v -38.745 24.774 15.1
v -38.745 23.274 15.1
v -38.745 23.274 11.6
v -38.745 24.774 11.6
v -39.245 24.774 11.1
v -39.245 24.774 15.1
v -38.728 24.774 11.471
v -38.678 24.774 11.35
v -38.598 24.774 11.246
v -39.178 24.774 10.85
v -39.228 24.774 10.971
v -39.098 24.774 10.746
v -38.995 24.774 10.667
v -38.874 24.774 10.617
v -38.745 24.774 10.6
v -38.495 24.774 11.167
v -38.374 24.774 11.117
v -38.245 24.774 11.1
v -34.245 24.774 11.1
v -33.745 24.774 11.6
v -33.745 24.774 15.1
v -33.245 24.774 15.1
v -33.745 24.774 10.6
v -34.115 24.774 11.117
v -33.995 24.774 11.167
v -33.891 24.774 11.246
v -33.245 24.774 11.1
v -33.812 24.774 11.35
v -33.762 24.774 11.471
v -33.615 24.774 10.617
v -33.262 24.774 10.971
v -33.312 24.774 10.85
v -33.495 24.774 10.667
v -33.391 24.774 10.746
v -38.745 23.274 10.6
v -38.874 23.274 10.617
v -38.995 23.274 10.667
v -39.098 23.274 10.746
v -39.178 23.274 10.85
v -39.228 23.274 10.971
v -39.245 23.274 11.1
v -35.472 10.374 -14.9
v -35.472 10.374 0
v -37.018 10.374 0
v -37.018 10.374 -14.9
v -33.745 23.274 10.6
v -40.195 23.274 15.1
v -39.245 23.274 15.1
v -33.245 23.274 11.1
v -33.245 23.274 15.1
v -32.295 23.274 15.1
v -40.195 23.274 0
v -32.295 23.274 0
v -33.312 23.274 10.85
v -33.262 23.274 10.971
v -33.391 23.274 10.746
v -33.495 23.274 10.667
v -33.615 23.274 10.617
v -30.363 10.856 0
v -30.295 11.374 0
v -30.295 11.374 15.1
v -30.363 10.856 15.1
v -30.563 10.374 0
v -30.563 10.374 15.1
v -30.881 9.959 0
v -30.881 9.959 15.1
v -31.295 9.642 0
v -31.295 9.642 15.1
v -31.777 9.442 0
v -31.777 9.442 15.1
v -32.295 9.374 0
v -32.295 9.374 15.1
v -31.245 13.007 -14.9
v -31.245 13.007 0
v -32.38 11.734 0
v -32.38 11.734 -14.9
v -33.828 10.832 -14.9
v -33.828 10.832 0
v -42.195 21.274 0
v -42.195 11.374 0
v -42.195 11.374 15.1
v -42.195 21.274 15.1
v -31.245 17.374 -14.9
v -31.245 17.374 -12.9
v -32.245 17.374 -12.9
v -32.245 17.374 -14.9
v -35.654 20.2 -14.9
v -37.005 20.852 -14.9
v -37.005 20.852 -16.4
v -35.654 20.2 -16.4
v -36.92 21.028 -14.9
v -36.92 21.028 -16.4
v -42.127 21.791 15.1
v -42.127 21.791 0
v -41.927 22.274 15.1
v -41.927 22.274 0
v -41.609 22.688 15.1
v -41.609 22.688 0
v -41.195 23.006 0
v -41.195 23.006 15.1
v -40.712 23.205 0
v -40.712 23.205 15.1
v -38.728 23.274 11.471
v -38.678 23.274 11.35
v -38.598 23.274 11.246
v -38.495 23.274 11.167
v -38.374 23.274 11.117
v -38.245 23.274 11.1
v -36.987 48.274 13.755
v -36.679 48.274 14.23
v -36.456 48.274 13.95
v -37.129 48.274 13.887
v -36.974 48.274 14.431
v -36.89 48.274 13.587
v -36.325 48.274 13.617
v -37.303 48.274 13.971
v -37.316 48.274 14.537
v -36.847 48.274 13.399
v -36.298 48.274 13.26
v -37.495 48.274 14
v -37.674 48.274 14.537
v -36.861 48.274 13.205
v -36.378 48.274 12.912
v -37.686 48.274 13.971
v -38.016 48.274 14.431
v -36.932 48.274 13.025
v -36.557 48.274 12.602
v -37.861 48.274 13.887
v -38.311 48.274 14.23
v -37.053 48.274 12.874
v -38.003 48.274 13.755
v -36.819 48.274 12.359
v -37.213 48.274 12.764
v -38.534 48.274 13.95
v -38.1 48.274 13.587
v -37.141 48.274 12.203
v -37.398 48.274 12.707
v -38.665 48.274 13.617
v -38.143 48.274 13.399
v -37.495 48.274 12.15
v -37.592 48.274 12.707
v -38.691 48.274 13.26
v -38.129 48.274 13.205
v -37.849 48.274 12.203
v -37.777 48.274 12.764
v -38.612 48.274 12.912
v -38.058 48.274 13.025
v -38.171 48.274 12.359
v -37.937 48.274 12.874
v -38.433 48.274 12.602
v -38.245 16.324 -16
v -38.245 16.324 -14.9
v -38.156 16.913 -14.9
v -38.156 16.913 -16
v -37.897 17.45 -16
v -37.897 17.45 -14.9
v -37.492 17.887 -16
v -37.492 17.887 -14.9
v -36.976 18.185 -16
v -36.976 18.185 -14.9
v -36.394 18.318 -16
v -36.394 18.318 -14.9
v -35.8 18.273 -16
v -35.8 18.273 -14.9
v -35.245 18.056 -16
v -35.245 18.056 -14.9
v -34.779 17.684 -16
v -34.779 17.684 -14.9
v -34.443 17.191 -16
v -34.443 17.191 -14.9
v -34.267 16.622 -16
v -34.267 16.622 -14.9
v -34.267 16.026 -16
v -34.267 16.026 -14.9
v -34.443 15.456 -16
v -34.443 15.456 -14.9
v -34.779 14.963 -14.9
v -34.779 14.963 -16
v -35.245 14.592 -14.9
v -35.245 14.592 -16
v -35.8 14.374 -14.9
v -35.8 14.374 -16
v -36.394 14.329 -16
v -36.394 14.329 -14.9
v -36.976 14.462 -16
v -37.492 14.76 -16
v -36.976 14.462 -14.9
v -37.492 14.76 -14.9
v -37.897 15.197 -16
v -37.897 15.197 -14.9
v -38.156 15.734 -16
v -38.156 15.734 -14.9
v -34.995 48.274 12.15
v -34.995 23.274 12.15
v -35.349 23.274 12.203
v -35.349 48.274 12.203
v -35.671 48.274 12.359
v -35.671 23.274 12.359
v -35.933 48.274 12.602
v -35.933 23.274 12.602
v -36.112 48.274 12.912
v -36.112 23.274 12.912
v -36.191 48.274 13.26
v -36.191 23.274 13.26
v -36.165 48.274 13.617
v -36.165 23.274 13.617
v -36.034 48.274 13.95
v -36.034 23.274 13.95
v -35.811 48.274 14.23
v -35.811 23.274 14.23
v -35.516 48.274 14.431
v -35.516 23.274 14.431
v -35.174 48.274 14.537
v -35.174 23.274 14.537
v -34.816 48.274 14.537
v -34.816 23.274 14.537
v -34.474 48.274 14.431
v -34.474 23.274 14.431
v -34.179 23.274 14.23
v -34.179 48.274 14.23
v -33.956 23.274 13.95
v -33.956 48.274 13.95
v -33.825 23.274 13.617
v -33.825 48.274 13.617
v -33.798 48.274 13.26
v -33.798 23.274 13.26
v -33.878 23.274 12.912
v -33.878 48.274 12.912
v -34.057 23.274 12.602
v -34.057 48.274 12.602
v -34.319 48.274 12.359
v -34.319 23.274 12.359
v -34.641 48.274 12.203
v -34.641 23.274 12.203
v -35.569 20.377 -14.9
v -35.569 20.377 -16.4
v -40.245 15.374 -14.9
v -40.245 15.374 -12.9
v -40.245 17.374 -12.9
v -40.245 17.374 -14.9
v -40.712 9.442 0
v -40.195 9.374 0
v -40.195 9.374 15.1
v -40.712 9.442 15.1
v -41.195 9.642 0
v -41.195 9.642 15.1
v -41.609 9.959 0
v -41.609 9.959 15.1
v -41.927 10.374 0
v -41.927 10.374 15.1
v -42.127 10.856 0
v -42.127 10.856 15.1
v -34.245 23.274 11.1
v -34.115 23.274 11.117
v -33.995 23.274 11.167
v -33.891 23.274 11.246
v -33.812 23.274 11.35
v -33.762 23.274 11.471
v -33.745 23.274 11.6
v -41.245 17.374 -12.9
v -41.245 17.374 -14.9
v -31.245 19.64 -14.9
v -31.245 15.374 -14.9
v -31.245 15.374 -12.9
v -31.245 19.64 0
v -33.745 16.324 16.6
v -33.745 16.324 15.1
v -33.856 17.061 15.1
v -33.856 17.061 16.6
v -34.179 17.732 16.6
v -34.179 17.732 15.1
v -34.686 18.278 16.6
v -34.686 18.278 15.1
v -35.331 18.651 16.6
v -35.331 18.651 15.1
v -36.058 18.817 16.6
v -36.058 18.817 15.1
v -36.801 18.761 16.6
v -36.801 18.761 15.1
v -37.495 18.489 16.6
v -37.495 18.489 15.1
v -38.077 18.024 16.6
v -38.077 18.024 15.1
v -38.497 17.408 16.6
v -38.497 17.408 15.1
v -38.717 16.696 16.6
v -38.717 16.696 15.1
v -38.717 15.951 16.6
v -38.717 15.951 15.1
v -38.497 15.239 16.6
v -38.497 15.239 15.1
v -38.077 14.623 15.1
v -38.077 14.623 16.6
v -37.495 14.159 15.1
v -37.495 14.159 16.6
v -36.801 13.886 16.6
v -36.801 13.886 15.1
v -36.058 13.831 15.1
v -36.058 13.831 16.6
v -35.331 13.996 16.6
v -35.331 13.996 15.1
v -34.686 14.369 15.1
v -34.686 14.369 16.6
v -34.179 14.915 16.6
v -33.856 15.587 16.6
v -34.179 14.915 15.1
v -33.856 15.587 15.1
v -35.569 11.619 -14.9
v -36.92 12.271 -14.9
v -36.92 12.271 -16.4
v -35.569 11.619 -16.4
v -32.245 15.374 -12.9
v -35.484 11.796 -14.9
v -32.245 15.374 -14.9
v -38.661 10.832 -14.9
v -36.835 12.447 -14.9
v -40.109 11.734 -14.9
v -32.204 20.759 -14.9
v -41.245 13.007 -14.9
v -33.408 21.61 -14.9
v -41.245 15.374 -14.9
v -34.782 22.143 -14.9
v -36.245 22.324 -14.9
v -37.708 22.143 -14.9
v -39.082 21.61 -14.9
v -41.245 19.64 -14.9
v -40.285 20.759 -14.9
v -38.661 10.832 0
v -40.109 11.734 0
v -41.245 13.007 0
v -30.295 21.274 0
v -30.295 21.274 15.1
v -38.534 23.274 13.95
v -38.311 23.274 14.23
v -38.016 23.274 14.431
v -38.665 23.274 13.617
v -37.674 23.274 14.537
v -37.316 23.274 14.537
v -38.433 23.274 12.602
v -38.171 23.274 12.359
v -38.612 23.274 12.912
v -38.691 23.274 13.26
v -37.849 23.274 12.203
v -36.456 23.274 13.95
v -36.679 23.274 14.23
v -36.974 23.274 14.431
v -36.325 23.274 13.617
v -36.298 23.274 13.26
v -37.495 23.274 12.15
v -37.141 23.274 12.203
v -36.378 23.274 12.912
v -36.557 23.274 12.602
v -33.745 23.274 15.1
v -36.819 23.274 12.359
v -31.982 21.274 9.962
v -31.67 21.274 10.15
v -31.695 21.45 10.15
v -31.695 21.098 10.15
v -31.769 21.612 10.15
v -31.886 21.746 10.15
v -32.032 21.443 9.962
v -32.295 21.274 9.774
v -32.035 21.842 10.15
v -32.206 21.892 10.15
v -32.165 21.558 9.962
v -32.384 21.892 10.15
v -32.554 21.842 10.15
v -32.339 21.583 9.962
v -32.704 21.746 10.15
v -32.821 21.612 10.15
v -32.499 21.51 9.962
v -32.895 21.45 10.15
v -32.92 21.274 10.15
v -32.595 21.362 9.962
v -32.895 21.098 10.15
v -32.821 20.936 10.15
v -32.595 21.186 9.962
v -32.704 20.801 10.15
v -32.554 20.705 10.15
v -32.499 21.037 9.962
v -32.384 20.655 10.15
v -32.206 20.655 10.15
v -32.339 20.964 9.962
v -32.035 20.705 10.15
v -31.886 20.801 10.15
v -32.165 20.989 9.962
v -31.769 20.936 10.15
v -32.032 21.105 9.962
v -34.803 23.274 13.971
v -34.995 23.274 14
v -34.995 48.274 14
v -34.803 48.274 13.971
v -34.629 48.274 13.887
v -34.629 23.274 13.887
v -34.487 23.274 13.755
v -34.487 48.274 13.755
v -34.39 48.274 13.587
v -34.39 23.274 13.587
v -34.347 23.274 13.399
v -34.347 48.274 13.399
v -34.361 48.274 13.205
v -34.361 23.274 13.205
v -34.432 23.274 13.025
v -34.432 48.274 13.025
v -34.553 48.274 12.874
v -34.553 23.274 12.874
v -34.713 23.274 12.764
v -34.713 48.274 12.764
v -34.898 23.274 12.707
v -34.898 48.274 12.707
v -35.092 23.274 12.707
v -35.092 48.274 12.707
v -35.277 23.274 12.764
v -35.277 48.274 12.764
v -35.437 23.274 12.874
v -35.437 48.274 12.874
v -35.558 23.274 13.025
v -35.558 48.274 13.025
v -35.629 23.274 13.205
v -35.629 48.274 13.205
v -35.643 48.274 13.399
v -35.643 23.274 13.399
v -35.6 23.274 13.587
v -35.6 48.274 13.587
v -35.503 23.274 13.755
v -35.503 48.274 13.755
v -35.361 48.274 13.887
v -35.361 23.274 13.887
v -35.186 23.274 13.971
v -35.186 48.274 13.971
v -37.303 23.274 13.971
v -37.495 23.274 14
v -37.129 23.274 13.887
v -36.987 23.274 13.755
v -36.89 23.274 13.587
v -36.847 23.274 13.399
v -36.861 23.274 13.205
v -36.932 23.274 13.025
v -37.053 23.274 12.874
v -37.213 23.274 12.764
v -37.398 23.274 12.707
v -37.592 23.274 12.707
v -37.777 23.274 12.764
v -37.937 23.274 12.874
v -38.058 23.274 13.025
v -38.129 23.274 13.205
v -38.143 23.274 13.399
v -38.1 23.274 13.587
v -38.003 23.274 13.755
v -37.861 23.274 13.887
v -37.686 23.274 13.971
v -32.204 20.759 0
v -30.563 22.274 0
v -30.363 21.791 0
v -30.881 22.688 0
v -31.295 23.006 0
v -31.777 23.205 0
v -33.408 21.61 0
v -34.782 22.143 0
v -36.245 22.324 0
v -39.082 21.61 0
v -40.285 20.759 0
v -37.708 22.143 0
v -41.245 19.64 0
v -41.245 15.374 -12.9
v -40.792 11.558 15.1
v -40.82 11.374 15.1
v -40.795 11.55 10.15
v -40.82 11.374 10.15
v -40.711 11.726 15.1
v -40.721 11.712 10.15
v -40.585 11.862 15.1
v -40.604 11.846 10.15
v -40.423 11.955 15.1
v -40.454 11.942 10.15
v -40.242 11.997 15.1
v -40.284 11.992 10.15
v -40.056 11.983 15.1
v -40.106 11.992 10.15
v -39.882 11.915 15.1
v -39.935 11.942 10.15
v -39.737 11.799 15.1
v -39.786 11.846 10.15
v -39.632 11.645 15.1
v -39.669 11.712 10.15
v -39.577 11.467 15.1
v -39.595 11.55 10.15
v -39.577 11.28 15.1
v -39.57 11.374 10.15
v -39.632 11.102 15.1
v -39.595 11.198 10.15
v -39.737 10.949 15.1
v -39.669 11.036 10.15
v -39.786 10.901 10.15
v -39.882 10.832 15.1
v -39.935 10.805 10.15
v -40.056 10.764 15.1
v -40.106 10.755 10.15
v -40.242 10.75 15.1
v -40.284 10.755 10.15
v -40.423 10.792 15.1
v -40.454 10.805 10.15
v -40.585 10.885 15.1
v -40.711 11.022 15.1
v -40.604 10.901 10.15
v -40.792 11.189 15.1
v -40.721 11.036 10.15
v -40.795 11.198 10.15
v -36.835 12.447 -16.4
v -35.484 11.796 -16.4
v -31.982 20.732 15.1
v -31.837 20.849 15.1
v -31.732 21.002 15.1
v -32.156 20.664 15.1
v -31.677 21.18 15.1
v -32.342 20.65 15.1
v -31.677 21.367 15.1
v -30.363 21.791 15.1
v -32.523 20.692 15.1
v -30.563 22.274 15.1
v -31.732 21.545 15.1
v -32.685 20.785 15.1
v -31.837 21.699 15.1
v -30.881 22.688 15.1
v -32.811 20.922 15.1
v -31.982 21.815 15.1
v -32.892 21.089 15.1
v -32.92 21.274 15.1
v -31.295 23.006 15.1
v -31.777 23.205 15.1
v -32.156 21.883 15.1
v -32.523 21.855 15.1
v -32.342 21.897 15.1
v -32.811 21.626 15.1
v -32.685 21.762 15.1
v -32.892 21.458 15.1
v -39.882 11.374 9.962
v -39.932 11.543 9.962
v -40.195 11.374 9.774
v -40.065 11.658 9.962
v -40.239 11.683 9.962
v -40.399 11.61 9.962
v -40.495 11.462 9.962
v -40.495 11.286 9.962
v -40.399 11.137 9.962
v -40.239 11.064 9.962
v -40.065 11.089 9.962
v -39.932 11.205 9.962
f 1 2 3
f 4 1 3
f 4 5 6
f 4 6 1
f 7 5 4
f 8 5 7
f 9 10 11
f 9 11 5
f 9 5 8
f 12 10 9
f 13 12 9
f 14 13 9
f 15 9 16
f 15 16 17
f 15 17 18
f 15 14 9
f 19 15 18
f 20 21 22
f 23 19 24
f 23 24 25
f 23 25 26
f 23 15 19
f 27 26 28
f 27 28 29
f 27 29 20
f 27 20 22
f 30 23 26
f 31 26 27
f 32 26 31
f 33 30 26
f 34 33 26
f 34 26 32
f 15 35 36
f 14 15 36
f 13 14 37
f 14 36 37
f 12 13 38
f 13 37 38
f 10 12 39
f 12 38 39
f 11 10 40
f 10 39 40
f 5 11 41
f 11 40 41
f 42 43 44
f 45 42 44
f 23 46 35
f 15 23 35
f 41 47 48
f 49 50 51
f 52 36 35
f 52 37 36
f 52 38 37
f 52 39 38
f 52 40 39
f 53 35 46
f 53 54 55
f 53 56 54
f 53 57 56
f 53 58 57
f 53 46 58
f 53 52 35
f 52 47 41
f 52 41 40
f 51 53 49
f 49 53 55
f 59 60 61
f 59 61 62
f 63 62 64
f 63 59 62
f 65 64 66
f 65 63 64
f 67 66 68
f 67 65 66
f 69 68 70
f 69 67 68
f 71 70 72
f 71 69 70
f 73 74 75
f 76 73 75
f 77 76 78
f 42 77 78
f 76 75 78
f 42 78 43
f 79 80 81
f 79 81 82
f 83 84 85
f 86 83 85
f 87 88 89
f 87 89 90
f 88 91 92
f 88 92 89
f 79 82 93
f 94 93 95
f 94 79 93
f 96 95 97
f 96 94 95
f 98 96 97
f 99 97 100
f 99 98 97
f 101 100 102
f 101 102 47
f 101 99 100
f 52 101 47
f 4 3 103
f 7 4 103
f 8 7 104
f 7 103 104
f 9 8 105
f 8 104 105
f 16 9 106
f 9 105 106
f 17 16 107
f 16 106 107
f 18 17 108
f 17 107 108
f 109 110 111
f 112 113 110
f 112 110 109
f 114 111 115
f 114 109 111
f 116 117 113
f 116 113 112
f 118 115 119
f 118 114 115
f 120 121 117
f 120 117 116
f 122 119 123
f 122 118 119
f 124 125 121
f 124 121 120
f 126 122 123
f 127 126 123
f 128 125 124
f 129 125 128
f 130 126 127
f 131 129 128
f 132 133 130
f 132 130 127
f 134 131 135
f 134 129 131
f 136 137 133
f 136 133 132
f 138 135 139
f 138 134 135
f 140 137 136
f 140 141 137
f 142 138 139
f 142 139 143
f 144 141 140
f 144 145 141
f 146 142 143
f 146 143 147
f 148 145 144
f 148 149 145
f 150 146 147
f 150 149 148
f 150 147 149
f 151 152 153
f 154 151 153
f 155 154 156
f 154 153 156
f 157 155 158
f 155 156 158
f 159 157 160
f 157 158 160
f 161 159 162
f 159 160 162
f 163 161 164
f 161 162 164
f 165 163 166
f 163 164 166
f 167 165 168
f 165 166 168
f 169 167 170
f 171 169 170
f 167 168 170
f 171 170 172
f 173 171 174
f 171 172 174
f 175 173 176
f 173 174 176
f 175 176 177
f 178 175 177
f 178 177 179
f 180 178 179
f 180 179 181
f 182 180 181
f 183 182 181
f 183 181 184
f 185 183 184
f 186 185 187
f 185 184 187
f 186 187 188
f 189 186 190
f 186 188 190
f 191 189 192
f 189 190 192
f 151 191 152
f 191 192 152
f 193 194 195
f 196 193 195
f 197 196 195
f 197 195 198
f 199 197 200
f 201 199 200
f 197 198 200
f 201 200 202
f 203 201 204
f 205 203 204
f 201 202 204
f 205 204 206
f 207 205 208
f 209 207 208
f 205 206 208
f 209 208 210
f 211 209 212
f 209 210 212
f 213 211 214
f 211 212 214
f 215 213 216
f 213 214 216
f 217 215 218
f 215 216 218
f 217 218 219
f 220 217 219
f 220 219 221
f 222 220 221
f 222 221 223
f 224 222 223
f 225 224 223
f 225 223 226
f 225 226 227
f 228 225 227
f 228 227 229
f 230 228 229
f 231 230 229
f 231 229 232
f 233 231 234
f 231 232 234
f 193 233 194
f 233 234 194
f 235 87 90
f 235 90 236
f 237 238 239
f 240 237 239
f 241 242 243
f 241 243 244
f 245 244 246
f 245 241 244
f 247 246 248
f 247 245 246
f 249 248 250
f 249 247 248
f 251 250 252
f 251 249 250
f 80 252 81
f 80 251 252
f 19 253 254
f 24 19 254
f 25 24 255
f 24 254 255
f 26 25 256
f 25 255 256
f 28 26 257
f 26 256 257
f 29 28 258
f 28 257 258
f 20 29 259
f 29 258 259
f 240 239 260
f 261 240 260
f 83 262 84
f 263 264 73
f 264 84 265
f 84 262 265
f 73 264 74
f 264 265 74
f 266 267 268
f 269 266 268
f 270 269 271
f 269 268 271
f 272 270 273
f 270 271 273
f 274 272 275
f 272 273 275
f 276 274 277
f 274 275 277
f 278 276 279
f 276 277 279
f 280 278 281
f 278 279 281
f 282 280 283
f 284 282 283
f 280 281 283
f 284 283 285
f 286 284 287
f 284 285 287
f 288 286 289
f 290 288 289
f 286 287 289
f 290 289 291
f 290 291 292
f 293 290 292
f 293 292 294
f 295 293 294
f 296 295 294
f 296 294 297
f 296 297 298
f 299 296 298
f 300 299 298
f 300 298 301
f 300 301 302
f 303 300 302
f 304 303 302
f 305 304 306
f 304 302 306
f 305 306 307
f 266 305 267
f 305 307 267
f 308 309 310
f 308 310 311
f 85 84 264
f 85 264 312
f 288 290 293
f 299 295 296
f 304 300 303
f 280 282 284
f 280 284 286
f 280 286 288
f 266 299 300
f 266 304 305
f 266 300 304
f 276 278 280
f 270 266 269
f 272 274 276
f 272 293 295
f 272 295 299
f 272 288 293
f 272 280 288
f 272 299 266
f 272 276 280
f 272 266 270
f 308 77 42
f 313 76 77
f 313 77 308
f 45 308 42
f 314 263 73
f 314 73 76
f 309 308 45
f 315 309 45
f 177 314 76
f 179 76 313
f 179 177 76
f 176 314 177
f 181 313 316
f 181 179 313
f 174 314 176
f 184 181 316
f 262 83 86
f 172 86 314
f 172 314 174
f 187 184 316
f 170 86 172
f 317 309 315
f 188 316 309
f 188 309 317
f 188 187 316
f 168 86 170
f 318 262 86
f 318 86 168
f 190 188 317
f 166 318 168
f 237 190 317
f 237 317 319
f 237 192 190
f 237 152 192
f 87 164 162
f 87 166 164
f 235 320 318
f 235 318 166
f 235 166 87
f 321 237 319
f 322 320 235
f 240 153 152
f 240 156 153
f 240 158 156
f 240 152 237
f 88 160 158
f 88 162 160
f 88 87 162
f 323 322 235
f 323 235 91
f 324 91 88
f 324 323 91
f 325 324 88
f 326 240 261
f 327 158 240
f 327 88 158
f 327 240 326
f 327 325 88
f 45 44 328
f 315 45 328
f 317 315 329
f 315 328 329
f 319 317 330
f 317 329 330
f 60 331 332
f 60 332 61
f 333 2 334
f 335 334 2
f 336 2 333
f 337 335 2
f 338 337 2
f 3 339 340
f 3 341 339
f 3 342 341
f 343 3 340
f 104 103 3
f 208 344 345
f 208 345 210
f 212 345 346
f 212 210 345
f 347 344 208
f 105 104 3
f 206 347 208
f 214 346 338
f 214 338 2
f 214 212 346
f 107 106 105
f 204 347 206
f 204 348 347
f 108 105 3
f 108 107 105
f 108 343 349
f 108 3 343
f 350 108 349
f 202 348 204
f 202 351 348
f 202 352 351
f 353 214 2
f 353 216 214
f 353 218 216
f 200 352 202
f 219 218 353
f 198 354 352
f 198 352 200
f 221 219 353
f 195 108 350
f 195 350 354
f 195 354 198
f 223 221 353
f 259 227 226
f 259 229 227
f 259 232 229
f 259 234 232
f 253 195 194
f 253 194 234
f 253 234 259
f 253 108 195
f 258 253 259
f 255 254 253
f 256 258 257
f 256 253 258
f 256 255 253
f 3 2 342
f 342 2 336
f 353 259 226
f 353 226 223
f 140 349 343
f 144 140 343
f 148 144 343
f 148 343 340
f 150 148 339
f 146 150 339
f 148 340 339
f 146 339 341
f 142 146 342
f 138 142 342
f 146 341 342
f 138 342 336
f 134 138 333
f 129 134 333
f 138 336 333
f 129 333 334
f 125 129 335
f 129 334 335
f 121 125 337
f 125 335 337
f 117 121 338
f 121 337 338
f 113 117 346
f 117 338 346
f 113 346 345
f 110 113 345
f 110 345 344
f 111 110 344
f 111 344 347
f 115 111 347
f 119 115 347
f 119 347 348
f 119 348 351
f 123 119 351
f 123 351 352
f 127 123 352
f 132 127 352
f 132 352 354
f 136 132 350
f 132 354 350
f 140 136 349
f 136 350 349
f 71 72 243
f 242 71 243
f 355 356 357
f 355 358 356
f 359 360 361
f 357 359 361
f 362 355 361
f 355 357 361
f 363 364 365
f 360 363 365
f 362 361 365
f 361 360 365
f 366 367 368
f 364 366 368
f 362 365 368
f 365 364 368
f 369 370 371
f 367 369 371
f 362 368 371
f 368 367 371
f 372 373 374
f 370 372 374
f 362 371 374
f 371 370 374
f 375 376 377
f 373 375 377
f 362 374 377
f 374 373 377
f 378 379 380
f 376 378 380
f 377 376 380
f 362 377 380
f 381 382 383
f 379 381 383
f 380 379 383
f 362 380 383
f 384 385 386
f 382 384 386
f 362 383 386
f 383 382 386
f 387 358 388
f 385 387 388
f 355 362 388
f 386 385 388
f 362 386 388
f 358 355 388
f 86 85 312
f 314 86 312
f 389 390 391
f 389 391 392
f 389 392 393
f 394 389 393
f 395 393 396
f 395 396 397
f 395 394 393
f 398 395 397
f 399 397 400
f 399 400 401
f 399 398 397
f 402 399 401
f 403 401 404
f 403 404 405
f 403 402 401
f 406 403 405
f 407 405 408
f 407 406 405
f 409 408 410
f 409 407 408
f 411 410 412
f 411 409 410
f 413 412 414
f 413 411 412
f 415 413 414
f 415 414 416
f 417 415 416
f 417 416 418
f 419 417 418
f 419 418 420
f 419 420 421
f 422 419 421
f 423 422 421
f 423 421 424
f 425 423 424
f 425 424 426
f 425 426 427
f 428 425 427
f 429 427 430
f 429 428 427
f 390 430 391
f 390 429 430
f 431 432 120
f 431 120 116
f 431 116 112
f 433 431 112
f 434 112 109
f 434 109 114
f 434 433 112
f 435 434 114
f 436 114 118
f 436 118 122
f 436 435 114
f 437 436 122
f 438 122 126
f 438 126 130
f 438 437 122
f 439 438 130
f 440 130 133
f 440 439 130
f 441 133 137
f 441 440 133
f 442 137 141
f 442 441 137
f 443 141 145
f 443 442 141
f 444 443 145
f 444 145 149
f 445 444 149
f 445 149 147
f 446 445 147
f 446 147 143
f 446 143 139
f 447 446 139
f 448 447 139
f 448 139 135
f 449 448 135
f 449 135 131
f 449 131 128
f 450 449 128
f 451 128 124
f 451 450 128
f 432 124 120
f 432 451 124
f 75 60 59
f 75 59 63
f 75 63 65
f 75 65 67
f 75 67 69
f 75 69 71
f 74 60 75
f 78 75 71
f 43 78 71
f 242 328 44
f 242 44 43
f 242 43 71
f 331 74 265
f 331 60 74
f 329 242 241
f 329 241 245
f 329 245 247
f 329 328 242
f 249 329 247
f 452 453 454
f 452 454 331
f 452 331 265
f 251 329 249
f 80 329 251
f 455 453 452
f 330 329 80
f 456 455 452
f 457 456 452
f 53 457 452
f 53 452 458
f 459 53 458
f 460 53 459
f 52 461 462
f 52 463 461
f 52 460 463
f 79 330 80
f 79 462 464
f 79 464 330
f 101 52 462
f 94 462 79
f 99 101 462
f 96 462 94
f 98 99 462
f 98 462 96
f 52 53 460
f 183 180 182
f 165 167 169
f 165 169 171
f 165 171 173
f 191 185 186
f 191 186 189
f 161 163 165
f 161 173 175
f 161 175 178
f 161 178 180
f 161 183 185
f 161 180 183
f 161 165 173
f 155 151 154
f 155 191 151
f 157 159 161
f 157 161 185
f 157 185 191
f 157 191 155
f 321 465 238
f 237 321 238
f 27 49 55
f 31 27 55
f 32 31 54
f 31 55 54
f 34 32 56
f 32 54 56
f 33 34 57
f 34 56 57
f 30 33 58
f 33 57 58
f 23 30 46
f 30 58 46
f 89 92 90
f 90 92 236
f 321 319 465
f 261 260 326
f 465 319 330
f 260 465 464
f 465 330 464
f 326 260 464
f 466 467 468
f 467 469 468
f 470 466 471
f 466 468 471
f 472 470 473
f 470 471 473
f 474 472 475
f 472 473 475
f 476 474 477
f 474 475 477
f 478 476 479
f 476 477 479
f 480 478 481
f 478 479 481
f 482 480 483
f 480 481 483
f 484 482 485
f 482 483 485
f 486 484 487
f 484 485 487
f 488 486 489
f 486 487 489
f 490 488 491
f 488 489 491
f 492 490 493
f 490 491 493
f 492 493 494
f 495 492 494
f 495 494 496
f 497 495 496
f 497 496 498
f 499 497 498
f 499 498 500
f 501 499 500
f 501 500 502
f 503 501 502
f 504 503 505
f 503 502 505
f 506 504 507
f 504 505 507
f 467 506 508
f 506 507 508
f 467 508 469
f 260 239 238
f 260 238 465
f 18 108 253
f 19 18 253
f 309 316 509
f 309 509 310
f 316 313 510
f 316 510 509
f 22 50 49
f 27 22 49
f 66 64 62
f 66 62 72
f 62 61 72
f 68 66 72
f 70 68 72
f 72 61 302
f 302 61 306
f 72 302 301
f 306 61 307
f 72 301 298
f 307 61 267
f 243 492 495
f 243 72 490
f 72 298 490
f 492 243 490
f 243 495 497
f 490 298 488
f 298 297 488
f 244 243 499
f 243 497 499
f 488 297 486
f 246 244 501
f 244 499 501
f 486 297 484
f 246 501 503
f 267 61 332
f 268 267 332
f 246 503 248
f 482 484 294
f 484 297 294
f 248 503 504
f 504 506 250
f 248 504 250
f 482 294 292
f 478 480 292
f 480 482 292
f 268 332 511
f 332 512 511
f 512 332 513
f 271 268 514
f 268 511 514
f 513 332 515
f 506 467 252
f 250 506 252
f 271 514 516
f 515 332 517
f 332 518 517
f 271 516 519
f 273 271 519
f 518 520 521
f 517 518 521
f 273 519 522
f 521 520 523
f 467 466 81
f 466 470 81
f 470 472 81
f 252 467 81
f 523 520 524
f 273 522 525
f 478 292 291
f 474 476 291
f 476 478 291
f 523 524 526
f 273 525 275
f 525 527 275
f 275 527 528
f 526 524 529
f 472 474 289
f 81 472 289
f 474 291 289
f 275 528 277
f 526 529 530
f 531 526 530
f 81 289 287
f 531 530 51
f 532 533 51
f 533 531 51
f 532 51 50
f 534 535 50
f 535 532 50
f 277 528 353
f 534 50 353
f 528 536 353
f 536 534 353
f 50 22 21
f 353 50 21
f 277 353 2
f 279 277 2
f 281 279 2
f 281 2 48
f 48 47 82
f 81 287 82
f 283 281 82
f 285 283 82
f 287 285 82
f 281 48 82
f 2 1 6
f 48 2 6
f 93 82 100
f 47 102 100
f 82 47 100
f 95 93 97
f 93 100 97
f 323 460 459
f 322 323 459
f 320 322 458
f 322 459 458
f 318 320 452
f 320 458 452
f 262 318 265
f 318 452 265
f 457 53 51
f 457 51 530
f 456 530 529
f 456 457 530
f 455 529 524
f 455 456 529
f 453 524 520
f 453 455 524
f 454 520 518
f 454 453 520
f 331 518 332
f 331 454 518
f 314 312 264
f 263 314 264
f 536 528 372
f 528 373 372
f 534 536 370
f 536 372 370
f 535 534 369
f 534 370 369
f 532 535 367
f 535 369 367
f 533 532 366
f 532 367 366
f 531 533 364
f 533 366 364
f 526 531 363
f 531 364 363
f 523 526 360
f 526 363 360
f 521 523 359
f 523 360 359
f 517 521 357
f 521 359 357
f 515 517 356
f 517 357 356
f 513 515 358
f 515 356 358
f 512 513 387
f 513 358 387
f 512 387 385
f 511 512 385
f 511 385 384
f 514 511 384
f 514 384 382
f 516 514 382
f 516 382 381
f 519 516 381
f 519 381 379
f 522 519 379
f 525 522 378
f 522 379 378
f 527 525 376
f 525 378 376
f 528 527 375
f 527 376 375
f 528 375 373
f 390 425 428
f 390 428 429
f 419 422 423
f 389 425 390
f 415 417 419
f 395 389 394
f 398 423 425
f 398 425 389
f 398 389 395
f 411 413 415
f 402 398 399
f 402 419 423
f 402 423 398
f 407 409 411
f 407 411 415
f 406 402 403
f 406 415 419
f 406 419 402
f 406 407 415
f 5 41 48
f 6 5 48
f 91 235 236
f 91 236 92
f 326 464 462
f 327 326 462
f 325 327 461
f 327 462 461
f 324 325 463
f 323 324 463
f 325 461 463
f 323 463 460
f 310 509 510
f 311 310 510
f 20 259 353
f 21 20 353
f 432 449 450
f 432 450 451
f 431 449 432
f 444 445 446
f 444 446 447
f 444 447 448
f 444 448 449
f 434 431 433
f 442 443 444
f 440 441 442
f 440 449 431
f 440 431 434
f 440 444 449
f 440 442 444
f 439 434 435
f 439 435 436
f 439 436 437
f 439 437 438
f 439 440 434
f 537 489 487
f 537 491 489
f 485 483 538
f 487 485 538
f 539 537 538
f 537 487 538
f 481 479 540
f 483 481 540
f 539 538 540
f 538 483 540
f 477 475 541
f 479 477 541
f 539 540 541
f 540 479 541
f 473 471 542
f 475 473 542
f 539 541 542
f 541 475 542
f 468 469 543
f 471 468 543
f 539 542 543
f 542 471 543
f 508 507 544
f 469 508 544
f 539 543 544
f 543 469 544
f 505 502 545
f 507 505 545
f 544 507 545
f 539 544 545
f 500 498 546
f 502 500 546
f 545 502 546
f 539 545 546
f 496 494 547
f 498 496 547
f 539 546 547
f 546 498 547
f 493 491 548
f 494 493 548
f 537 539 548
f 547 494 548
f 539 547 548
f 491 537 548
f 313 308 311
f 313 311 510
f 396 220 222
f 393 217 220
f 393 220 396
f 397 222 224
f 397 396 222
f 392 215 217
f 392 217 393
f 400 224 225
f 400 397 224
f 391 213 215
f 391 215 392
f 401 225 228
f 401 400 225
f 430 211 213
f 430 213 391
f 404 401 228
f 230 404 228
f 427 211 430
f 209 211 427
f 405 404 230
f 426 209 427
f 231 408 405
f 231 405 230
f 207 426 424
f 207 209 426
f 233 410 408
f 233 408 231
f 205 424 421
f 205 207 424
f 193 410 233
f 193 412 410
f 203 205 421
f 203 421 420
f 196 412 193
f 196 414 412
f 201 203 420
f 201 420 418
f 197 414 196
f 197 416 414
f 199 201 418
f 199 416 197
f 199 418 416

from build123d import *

# Parameters (mm, degrees)
EXTRUDE_1_DEPTH   = 15.1
SKETCH_2_R        = 2.5
EXTRUDE_2_DEPTH   = 1.5
EXTRUDE_3_DEPTH   = 1.5
M1_6X0_35_1_D     = 1.25
M1_6X0_35_1_DEPTH = 4.95
M1_6X0_35_1_TIP   = 0.375537887
EXTRUDE_4_DEPTH   = 14.9
SKETCH_7_3_W      = 1
SKETCH_7_3_H      = 2
EXTRUDE_5_DEPTH   = 12.9
SKETCH_8_R        = 2
EXTRUDE_6_DEPTH   = 1.1
EXTRUDE_7_DEPTH   = 1.5
SKETCH_10_R       = 1.2
SKETCH_10_R_2     = 0.65
EXTRUDE_13_DEPTH  = 25


with BuildPart() as part:
    # ｽｹｯﾁ1 → ﾎﾞｽ - 押し出し1 (new body)
    with BuildSketch(Plane.XY):
        with BuildLine():
            Line((-40.194845485, 23.273623853), (-32.294845485, 23.273623853))
            ThreePointArc((-32.294845485, 23.273623853), (-30.880631923, 22.687837416), (-30.294845485, 21.273623853))
            Line((-30.294845485, 21.273623853), (-30.294845485, 11.373623853))
            ThreePointArc((-30.294845485, 11.373623853), (-30.880631923, 9.959410291), (-32.294845485, 9.373623853))
            Line((-32.294845485, 9.373623853), (-40.194845485, 9.373623853))
            ThreePointArc((-40.194845485, 9.373623853), (-41.609059048, 9.959410291), (-42.194845485, 11.373623853))
            Line((-42.194845485, 11.373623853), (-42.194845485, 21.273623853))
            ThreePointArc((-42.194845485, 21.273623853), (-41.609059048, 22.687837416), (-40.194845485, 23.273623853))
        make_face()
    extrude(amount=EXTRUDE_1_DEPTH)

    # ｽｹｯﾁ2 → ﾎﾞｽ - 押し出し2 (add)
    with BuildSketch(Plane.XY.offset(15.1)):
        with Locations((-36.244845485, 16.323623853)):
            Circle(SKETCH_2_R)
    extrude(amount=EXTRUDE_2_DEPTH)

    # ｽｹｯﾁ3 → ﾎﾞｽ - 押し出し3 (add)
    with BuildSketch(Plane(origin=(0, 23.273623853, 0), x_dir=(1, 0, 0), z_dir=(0, 1, 0))):
        with BuildLine():
            Line((-33.744845485, -10.6), (-38.744845485, -10.6))
            ThreePointArc((-38.744845485, -10.6), (-39.098398876, -10.746446609), (-39.244845485, -11.1))
            Line((-39.244845485, -11.1), (-39.244845485, -15.1))
            Line((-39.244845485, -15.1), (-38.744845485, -15.1))
            Line((-38.744845485, -15.1), (-38.744845485, -14.6))
            Line((-38.744845485, -14.6), (-38.744845485, -11.6))
            ThreePointArc((-38.744845485, -11.6), (-38.598398876, -11.246446609), (-38.244845485, -11.1))
            Line((-38.244845485, -11.1), (-34.244845485, -11.1))
            ThreePointArc((-34.244845485, -11.1), (-33.891292095, -11.246446609), (-33.744845485, -11.6))
            Line((-33.744845485, -11.6), (-33.744845485, -14.6))
            Line((-33.744845485, -14.6), (-33.744845485, -15.1))
            Line((-33.744845485, -15.1), (-33.244845485, -15.1))
            Line((-33.244845485, -15.1), (-33.244845485, -11.1))
            ThreePointArc((-33.244845485, -11.1), (-33.391292095, -10.746446609), (-33.744845485, -10.6))
        make_face()
    extrude(amount=EXTRUDE_3_DEPTH)

    # M1.6x0.35 ねじ穴1
    with Locations(Plane(origin=(-32.294845485, 21.273623853, 15.1), x_dir=(1, 0, 0), z_dir=(0, 0, 1))):
        with Locations((0, 0), (-7.9, -9.9)):
            Hole(M1_6X0_35_1_D / 2, depth=M1_6X0_35_1_DEPTH)
            with Locations((0, 0, -(M1_6X0_35_1_DEPTH + M1_6X0_35_1_TIP / 2))):  # 118° drill point
                Cone(0, M1_6X0_35_1_D / 2, M1_6X0_35_1_TIP, mode=Mode.SUBTRACT)

    # ｽｹｯﾁ7 → ﾎﾞｽ - 押し出し4 (add)
    with BuildSketch(Plane(origin=(0, 0, 0), x_dir=(-1, 0, 0), z_dir=(0, 0, -1))):
        with BuildLine():
            ThreePointArc((41.244845485, 19.640248644), (36.244845485, 22.323623853), (31.244845485, 19.640248644))
            Line((31.244845485, 19.640248644), (31.244845485, 17.373623853))
            Line((31.244845485, 17.373623853), (32.244845485, 17.373623853))
            Line((32.244845485, 17.373623853), (32.244845485, 15.373623853))
            Line((32.244845485, 15.373623853), (31.244845485, 15.373623853))
            Line((31.244845485, 15.373623853), (31.244845485, 13.006999063))
            ThreePointArc((31.244845485, 13.006999063), (33.072229159, 11.231030639), (35.471864244, 10.373623853))
            Line((35.471864244, 10.373623853), (37.017826727, 10.373623853))
            ThreePointArc((37.017826727, 10.373623853), (39.417461811, 11.231030639), (41.244845485, 13.006999063))
            Line((41.244845485, 13.006999063), (41.244845485, 15.373623853))
            Line((41.244845485, 15.373623853), (40.244845485, 15.373623853))
            Line((40.244845485, 15.373623853), (40.244845485, 17.373623853))
            Line((40.244845485, 17.373623853), (41.244845485, 17.373623853))
            Line((41.244845485, 17.373623853), (41.244845485, 19.640248644))
        make_face()
    extrude(amount=EXTRUDE_4_DEPTH)

    # ｽｹｯﾁ7<3> → ﾎﾞｽ - 押し出し5 (add)
    with BuildSketch(Plane(origin=(0, 0, 0), x_dir=(-1, 0, 0), z_dir=(0, 0, -1))):
        with Locations((31.744845485, 16.373623853)):
            Rectangle(SKETCH_7_3_W, SKETCH_7_3_H)
        with Locations((40.744845485, 16.373623853)):
            Rectangle(SKETCH_7_3_W, SKETCH_7_3_H)
    extrude(amount=EXTRUDE_5_DEPTH)

    # ｽｹｯﾁ8 → ﾎﾞｽ - 押し出し6 (add)
    with BuildSketch(Plane(origin=(0, 0, -14.9), x_dir=(-1, 0, 0), z_dir=(0, 0, -1))):
        with Locations((36.244845485, 16.323623853)):
            Circle(SKETCH_8_R)
    extrude(amount=EXTRUDE_6_DEPTH)

    # ｽｹｯﾁ8<3> → ﾎﾞｽ - 押し出し7 (add)
    with BuildSketch(Plane(origin=(0, 0, -14.9), x_dir=(-1, 0, 0), z_dir=(0, 0, -1))):
        Polygon((36.920421996, 21.028017883), (35.569268974, 20.376569105), (35.654303745, 20.200200691), (37.005456768, 20.851649469), align=None)
        Polygon((35.569268974, 11.619229823), (36.920421996, 12.270678601), (36.835387225, 12.447047016), (35.484234203, 11.795598237), align=None)
    extrude(amount=EXTRUDE_7_DEPTH)

    # ｽｹｯﾁ10 → ﾎﾞｽ - 押し出し13 (add)
    # profile 1 of 2: a face of its own
    with BuildSketch(Plane(origin=(0, 23.273623853, 0), x_dir=(1, 0, 0), z_dir=(0, 1, 0))):
        with Locations((-37.494845485, -13.35)):
            Circle(SKETCH_10_R)
        with Locations((-37.494845485, -13.35)):
            Circle(SKETCH_10_R_2, mode=Mode.SUBTRACT)
    # profile 2 of 2: a face of its own
    with BuildSketch(Plane(origin=(0, 23.273623853, 0), x_dir=(1, 0, 0), z_dir=(0, 1, 0))):
        with Locations((-34.994845485, -13.35)):
            Circle(SKETCH_10_R)
        with Locations((-34.994845485, -13.35)):
            Circle(SKETCH_10_R_2, mode=Mode.SUBTRACT)
    extrude(amount=EXTRUDE_13_DEPTH)


solid = part.part
